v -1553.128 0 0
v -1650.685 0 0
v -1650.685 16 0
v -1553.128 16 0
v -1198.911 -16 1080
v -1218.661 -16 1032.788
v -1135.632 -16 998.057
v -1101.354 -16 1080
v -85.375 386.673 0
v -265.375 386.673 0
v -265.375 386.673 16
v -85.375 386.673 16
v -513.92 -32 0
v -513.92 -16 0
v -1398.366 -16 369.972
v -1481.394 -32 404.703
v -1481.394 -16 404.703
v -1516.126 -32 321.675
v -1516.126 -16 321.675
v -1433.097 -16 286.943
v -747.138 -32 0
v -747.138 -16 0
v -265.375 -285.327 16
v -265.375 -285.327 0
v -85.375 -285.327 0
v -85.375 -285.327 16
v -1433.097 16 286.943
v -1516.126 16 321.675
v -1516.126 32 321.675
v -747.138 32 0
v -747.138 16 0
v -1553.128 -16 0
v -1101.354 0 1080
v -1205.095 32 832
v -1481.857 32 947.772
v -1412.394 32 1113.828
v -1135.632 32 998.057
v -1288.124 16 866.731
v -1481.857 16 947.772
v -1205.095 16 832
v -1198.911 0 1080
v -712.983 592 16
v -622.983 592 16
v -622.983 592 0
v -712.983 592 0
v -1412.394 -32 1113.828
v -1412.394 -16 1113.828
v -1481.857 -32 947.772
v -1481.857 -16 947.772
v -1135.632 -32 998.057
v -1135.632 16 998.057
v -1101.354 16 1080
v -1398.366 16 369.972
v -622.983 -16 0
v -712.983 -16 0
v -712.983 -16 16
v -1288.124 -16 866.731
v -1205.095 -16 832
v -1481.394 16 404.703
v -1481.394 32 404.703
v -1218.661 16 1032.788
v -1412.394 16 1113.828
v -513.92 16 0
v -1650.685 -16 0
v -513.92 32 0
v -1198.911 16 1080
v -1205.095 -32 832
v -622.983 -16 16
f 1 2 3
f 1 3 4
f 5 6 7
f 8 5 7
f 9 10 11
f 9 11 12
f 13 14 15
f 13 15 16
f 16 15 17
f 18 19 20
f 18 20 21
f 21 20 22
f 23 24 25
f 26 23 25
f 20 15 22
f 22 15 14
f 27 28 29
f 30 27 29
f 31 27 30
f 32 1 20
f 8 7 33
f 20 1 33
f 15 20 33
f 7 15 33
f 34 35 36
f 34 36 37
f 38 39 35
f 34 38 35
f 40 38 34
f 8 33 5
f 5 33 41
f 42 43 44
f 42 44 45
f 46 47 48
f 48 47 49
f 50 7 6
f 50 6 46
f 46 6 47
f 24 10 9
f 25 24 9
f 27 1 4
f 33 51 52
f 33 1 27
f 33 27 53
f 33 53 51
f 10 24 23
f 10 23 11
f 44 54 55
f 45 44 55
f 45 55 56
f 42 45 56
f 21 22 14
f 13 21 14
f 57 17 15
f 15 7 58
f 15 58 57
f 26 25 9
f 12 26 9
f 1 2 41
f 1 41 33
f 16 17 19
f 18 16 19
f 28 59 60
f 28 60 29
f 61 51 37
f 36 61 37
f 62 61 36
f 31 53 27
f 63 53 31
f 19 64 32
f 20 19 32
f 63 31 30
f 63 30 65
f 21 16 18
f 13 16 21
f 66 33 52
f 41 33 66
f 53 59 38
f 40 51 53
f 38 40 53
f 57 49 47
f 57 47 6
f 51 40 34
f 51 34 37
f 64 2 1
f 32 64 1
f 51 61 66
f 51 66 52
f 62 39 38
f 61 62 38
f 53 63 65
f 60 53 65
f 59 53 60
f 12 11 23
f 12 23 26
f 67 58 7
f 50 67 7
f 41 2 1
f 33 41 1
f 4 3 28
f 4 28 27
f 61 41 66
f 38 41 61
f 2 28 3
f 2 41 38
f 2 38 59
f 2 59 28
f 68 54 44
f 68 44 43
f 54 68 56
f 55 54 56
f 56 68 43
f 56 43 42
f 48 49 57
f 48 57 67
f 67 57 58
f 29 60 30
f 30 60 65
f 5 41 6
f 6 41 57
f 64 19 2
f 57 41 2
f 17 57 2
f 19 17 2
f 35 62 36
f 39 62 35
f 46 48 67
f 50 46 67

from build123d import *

# Parameters (mm, degrees)
F1_DEPTH  = 16
F3_DEPTH  = 16
F6_DEPTH  = 16
F10_W     = 90
F10_H     = 16
F11_DEPTH = 608
F12_W     = 180
F12_H     = 672
F13_DEPTH = 16


with BuildPart() as f1:
    # F0 (on Front) → F1 (new body)
    with BuildSketch(Plane.XZ):
        Polygon((-1198.911438, 1080), (-1650.685224, 0), (-1553.128277, 0), (-1101.35449, 1080), align=None)
    extrude(amount=F1_DEPTH)

    # F2 (on face) → F3 (join)
    with BuildSketch(Plane.XZ.offset(16)):
        Polygon((-1516.125781, 321.674703), (-747.137652, 0), (-513.920262, 0), (-1481.394237, 404.703131), align=None)
    extrude(amount=F3_DEPTH)

    # F5 (on face) → F6 (join)
    with BuildSketch(Plane.XZ.offset(16)):
        Polygon((-1481.856688, 947.771518), (-1205.095261, 831.999706), (-1135.632173, 998.056562), (-1412.3936, 1113.828375), align=None)
    extrude(amount=F6_DEPTH)


with BuildPart() as f7_1:
    # F7: copy of F1
    add(f1.part)


with BuildPart() as f8_1:
    # F8: instance of F7_1
    add(f7_1.part.mirror(Plane.XZ))


with BuildPart() as f11:
    # F10 (on face) → F11 (new body)
    with BuildSketch(Plane(origin=(0, -16, 0), x_dir=(-1, 0, 0), z_dir=(0, 1, 0))):
        with Locations((667.982655, 8)):
            Rectangle(F10_W, F10_H)
    extrude(amount=F11_DEPTH)


with BuildPart() as f13:
    # F12 (on Top) → F13 (new body)
    with BuildSketch(Plane.XY):
        with Locations((-175.374881, 50.673135)):
            Rectangle(F12_W, F12_H)
    extrude(amount=F13_DEPTH)


solid = Compound([f1.part, f8_1.part, f11.part, f13.part])
